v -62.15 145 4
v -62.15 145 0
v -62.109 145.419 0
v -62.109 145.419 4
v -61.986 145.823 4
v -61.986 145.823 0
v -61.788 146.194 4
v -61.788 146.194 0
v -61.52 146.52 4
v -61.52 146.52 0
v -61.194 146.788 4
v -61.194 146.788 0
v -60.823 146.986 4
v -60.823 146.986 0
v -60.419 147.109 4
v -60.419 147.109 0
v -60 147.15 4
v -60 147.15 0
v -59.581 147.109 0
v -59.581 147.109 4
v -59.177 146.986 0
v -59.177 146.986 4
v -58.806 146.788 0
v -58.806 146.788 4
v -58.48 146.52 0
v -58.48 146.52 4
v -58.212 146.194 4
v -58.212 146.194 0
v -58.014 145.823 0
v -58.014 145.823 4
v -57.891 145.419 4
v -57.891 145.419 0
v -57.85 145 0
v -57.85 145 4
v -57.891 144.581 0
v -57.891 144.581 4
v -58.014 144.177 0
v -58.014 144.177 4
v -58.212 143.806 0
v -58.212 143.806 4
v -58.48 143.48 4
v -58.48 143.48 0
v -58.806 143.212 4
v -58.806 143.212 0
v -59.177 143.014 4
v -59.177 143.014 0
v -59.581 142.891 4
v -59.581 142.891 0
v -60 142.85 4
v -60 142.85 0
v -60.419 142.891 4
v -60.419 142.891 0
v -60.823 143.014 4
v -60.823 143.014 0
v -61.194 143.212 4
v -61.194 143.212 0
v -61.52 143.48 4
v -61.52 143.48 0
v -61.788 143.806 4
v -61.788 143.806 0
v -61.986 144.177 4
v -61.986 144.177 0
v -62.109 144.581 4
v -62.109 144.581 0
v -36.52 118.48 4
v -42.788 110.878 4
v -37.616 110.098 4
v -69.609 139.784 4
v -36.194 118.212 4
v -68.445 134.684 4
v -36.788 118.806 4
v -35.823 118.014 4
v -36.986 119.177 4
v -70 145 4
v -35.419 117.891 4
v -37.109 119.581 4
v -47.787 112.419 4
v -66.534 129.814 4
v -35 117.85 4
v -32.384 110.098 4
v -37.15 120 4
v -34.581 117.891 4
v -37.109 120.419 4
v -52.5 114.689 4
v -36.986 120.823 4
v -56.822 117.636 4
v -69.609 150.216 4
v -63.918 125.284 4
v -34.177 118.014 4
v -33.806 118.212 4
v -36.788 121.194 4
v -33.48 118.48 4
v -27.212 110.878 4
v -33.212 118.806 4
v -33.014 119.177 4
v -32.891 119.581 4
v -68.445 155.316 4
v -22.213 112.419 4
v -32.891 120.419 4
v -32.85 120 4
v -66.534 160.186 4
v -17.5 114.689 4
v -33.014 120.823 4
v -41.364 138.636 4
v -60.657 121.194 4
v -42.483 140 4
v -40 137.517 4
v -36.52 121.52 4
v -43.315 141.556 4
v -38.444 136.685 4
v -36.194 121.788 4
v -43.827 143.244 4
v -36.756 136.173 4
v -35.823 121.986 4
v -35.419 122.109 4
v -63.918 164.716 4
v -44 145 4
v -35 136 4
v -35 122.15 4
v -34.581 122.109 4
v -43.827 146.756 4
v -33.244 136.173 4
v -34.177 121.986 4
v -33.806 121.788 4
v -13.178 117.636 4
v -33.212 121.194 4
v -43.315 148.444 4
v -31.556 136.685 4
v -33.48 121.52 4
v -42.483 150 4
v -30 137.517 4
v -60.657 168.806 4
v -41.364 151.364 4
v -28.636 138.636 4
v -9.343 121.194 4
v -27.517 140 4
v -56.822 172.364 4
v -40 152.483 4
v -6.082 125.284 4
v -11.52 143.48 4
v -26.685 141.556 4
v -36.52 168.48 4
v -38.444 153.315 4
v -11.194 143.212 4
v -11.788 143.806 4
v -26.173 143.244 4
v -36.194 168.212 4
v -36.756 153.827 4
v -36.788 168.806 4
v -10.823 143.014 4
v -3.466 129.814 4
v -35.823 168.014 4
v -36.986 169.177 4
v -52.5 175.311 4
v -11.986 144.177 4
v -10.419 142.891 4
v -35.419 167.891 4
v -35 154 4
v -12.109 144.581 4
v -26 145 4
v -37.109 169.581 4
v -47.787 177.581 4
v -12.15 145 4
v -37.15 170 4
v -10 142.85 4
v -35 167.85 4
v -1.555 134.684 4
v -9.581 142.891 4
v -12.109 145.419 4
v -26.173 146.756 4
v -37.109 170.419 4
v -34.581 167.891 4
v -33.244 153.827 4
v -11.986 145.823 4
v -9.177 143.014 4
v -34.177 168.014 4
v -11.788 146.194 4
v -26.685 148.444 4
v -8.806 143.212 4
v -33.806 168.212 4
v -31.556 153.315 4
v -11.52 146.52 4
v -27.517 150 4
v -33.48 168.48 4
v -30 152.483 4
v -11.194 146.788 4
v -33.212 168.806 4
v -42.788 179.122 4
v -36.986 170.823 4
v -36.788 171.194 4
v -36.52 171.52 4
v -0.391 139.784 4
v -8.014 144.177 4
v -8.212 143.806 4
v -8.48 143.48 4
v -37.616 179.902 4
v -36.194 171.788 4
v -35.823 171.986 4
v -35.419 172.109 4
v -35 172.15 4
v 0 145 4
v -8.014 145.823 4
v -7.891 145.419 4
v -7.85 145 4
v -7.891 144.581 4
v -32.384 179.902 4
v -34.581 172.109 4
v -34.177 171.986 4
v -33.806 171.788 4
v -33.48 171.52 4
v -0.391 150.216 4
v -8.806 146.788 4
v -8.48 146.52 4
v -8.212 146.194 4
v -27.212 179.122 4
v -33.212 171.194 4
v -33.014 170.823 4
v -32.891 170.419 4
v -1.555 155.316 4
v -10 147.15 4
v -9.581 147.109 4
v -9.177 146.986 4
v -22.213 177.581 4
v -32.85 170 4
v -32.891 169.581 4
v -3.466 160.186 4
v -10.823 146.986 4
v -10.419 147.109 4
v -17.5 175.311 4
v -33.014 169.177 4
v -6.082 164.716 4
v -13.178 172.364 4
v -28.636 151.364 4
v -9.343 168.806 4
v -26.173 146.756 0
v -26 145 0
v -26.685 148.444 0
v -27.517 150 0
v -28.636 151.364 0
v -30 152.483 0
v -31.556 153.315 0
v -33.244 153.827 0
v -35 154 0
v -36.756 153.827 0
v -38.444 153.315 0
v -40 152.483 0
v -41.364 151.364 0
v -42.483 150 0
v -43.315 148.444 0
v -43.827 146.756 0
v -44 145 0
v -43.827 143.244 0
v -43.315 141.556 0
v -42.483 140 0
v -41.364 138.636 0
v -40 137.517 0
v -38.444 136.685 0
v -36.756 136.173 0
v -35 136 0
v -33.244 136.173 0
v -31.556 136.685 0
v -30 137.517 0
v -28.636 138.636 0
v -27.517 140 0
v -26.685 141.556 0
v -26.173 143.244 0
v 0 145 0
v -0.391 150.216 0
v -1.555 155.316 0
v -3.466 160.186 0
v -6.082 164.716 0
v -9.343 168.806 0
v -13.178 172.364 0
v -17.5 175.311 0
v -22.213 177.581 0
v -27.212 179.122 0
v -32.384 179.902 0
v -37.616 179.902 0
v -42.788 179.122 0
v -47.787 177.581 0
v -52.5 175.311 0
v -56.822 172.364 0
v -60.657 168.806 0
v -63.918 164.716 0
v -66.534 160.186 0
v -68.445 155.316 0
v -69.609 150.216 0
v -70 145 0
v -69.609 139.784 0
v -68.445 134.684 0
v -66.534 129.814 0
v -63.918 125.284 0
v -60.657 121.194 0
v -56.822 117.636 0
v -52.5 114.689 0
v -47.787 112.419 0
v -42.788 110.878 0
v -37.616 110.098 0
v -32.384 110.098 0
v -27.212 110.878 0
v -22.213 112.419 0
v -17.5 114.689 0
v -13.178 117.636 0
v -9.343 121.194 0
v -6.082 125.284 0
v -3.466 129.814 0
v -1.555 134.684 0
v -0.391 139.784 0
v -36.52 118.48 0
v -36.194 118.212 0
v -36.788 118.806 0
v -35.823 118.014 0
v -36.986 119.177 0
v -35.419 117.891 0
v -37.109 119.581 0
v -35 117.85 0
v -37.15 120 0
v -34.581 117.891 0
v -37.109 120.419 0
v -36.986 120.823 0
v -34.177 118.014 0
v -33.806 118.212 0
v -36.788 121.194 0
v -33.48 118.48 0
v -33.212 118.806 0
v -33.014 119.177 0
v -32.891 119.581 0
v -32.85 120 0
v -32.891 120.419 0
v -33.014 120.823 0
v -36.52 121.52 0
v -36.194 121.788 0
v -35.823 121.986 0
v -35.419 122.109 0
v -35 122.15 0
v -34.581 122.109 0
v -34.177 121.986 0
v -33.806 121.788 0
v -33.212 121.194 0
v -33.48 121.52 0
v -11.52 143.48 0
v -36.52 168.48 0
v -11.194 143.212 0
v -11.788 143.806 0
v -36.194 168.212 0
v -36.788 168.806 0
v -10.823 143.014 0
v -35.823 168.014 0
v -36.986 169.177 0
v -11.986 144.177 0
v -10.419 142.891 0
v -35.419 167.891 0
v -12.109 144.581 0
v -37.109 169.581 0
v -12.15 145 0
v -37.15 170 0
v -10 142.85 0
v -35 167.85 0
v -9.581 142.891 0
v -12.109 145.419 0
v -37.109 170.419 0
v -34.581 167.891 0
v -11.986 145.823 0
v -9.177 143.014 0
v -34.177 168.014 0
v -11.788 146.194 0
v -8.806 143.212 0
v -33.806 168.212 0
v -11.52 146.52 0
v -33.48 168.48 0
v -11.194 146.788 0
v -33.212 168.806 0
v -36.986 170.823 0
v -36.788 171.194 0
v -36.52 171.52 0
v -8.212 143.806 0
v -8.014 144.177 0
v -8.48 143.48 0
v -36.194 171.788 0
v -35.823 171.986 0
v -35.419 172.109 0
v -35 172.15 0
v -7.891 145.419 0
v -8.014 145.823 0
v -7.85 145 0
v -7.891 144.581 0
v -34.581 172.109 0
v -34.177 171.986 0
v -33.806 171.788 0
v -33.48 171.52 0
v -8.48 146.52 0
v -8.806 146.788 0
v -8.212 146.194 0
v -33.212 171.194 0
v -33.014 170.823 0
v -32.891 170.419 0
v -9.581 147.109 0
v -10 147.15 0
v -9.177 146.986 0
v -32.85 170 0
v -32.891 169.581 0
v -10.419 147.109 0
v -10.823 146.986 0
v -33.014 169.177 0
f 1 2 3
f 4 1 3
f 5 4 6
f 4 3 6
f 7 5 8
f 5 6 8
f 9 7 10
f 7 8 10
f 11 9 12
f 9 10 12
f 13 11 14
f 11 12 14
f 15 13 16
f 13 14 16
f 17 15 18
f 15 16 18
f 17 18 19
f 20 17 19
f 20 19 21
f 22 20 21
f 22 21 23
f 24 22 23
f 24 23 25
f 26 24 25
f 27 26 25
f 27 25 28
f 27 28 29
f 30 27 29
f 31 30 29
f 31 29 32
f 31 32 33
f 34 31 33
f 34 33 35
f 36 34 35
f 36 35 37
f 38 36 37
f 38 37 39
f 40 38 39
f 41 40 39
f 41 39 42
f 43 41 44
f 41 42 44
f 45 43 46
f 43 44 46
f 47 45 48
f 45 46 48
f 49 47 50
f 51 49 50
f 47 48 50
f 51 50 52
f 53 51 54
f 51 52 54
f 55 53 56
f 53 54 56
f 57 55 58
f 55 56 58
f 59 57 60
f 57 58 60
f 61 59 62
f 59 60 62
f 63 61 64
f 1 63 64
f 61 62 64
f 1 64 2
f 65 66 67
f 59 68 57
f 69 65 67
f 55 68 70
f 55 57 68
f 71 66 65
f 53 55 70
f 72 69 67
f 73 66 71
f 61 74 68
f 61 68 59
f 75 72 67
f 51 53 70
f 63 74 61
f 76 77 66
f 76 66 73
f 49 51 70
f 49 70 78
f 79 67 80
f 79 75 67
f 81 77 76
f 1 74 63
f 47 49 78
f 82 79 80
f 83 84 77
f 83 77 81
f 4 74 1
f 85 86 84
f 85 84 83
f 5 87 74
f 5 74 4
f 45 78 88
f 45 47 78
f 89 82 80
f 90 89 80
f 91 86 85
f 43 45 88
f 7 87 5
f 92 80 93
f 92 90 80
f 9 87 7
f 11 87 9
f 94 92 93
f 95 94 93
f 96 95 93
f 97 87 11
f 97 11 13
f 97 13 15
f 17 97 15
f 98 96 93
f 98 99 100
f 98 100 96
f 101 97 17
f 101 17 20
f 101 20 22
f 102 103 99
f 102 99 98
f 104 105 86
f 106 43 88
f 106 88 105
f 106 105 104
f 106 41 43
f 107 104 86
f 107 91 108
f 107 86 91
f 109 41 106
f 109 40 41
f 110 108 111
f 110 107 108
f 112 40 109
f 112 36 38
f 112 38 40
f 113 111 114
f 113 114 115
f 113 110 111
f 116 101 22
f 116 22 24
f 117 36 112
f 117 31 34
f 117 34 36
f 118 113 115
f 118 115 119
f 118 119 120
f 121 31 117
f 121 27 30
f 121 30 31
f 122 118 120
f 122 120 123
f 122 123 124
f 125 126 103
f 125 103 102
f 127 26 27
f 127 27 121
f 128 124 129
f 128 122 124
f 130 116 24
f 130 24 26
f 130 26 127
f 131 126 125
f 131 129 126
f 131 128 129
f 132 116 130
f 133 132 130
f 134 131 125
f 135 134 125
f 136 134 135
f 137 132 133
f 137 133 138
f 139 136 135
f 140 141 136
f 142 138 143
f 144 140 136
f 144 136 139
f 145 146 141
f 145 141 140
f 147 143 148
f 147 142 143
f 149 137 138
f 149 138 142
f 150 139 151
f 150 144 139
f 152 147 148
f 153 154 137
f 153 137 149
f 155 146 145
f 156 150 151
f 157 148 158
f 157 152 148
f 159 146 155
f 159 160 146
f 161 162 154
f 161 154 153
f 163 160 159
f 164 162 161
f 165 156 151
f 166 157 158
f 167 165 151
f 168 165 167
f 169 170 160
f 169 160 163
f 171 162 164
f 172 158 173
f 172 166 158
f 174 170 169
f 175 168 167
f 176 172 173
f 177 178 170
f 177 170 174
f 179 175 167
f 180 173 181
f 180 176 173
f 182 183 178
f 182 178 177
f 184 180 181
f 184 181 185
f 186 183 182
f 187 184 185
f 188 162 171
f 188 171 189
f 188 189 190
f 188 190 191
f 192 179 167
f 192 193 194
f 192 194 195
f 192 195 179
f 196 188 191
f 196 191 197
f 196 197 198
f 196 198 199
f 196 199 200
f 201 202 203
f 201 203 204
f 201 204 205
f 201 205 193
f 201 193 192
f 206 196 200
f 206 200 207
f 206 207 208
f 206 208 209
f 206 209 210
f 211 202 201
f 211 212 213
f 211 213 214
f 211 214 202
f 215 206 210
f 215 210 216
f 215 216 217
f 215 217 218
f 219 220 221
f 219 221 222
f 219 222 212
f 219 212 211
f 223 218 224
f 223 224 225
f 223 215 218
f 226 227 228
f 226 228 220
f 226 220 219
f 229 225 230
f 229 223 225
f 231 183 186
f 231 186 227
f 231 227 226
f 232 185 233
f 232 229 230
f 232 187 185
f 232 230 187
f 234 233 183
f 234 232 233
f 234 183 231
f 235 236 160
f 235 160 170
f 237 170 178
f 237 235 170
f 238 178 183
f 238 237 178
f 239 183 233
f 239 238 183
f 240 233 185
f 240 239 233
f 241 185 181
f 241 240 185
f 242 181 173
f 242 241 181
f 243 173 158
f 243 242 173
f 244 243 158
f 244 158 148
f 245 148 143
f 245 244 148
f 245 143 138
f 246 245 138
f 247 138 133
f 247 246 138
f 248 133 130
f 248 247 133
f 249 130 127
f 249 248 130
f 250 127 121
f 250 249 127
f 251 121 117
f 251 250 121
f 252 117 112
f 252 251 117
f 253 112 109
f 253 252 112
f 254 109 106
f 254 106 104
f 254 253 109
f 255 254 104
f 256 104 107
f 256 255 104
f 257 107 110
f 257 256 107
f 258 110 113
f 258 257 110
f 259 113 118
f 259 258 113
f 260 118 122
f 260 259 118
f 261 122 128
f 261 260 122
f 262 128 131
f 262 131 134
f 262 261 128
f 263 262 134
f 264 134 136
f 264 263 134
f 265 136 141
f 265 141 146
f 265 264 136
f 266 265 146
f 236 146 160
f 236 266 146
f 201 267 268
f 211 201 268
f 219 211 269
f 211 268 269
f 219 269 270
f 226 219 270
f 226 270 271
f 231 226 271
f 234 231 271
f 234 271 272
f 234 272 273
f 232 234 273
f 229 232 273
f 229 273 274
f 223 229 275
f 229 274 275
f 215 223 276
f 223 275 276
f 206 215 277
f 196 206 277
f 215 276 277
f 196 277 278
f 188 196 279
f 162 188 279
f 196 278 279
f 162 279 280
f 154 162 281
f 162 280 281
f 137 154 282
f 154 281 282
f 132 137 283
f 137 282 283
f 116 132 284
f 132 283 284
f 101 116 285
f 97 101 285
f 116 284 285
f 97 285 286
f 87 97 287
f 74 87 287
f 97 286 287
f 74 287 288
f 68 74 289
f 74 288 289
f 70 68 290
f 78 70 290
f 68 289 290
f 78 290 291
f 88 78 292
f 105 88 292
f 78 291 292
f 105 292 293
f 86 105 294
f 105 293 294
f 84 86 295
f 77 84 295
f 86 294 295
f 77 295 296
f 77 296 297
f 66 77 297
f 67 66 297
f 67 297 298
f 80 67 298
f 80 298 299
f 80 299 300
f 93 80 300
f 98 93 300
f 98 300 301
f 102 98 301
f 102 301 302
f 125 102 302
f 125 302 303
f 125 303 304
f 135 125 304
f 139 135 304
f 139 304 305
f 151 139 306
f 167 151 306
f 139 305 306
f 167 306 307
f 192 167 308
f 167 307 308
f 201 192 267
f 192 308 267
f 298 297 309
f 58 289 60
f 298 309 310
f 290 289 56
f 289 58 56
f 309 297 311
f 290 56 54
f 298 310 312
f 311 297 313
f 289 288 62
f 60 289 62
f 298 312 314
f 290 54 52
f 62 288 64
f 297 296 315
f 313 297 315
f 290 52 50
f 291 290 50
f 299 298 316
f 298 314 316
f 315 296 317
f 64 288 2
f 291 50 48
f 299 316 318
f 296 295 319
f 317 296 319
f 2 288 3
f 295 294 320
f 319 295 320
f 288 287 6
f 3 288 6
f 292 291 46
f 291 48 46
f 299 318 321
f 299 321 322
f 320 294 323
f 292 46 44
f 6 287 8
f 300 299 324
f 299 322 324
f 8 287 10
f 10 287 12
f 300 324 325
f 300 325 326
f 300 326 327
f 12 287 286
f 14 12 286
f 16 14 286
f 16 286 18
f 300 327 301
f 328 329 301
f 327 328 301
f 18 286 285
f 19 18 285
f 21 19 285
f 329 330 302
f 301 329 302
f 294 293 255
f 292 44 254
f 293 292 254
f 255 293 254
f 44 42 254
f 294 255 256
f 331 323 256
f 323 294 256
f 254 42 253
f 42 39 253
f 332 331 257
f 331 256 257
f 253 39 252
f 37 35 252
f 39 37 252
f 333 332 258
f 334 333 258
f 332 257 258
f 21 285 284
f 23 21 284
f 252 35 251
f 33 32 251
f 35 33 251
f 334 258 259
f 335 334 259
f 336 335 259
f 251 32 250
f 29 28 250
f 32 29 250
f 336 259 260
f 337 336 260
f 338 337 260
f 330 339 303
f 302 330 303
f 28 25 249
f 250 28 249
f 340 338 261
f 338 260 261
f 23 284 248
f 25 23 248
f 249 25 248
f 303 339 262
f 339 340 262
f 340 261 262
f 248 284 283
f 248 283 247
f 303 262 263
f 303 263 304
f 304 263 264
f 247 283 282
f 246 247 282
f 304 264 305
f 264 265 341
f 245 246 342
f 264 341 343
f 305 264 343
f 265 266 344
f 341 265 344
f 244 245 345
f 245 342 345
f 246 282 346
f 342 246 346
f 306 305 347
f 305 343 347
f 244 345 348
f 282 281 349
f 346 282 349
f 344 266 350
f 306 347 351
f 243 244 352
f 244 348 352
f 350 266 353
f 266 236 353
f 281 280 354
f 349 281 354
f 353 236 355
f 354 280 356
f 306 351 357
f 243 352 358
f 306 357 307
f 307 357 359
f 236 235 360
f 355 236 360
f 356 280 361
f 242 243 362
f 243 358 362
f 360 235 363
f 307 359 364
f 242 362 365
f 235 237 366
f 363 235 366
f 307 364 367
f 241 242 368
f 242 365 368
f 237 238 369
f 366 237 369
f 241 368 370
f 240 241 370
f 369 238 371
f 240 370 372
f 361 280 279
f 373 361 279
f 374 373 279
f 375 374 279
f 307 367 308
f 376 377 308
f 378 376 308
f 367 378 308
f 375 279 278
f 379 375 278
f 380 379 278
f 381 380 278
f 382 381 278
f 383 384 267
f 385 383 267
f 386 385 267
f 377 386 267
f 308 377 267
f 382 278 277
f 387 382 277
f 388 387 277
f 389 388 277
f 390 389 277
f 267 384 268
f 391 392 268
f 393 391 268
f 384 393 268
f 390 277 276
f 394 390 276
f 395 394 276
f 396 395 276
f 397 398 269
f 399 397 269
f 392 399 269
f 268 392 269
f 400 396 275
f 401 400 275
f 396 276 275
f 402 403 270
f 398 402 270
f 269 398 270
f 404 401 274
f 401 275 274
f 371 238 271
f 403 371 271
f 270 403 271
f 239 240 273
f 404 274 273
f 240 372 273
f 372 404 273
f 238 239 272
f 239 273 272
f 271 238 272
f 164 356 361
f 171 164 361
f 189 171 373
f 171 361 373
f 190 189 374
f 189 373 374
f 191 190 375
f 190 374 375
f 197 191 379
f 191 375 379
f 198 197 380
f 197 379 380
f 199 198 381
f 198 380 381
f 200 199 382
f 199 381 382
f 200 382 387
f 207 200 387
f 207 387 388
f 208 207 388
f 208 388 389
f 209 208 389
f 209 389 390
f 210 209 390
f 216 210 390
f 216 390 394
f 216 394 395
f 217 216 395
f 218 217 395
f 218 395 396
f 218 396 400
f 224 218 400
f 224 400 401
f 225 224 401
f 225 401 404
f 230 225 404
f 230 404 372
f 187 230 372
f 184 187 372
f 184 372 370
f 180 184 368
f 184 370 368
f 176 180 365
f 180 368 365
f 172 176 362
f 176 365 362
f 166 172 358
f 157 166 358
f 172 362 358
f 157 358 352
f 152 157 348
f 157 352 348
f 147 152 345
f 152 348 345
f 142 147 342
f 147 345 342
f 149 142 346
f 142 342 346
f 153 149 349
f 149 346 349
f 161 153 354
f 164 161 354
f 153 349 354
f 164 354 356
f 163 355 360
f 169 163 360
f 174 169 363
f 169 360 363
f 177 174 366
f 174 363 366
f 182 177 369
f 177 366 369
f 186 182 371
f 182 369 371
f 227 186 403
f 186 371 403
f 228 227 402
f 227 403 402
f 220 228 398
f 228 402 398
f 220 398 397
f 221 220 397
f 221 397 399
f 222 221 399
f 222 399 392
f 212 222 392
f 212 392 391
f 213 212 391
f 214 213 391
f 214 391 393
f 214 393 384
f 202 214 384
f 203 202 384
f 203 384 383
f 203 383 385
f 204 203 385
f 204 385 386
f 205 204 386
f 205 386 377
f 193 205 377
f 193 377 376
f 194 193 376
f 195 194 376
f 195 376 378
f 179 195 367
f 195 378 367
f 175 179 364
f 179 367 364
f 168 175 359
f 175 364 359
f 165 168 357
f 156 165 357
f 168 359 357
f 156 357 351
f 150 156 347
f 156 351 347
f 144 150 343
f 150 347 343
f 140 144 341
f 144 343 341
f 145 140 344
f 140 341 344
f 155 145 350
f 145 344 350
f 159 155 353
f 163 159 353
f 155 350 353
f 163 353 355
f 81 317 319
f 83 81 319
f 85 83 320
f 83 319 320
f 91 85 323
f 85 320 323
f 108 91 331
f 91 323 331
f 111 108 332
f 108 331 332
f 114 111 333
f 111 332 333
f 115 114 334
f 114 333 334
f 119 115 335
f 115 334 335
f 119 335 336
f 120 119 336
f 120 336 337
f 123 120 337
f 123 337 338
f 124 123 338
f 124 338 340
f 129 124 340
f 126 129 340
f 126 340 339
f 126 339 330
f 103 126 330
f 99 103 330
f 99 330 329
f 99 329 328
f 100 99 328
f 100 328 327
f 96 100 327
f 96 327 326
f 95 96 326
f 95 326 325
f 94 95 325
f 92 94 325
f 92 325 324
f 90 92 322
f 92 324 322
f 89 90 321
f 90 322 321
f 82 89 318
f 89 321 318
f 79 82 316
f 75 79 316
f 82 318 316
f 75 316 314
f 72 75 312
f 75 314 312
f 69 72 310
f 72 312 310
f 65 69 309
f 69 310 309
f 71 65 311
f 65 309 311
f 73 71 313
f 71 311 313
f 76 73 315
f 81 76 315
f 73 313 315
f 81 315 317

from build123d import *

# Parameters (mm, degrees)
SKETCH1_R            = 9
BOSS_EXTRUDE1_DEPTH  = 4
M4_CLEARANCE_HOLE1_D = 4.3


with BuildPart() as part:
    # Sketch1 → Boss-Extrude1 (new body)
    with BuildSketch(Plane.XY):
        with BuildLine():
            ThreePointArc((-70, 145), (-35, 110), (0, 145))
            ThreePointArc((0, 145), (-35, 180), (-70, 145))
        make_face()
        with Locations((-35, 145)):
            Circle(SKETCH1_R, mode=Mode.SUBTRACT)
    extrude(amount=BOSS_EXTRUDE1_DEPTH)

    # M4 Clearance Hole1 (through all)
    with Locations(Plane.XY.offset(4)):
        with Locations((-35, 170), (-10, 145), (-35, 120), (-60, 145)):
            Hole(M4_CLEARANCE_HOLE1_D / 2)


solid = part.part
